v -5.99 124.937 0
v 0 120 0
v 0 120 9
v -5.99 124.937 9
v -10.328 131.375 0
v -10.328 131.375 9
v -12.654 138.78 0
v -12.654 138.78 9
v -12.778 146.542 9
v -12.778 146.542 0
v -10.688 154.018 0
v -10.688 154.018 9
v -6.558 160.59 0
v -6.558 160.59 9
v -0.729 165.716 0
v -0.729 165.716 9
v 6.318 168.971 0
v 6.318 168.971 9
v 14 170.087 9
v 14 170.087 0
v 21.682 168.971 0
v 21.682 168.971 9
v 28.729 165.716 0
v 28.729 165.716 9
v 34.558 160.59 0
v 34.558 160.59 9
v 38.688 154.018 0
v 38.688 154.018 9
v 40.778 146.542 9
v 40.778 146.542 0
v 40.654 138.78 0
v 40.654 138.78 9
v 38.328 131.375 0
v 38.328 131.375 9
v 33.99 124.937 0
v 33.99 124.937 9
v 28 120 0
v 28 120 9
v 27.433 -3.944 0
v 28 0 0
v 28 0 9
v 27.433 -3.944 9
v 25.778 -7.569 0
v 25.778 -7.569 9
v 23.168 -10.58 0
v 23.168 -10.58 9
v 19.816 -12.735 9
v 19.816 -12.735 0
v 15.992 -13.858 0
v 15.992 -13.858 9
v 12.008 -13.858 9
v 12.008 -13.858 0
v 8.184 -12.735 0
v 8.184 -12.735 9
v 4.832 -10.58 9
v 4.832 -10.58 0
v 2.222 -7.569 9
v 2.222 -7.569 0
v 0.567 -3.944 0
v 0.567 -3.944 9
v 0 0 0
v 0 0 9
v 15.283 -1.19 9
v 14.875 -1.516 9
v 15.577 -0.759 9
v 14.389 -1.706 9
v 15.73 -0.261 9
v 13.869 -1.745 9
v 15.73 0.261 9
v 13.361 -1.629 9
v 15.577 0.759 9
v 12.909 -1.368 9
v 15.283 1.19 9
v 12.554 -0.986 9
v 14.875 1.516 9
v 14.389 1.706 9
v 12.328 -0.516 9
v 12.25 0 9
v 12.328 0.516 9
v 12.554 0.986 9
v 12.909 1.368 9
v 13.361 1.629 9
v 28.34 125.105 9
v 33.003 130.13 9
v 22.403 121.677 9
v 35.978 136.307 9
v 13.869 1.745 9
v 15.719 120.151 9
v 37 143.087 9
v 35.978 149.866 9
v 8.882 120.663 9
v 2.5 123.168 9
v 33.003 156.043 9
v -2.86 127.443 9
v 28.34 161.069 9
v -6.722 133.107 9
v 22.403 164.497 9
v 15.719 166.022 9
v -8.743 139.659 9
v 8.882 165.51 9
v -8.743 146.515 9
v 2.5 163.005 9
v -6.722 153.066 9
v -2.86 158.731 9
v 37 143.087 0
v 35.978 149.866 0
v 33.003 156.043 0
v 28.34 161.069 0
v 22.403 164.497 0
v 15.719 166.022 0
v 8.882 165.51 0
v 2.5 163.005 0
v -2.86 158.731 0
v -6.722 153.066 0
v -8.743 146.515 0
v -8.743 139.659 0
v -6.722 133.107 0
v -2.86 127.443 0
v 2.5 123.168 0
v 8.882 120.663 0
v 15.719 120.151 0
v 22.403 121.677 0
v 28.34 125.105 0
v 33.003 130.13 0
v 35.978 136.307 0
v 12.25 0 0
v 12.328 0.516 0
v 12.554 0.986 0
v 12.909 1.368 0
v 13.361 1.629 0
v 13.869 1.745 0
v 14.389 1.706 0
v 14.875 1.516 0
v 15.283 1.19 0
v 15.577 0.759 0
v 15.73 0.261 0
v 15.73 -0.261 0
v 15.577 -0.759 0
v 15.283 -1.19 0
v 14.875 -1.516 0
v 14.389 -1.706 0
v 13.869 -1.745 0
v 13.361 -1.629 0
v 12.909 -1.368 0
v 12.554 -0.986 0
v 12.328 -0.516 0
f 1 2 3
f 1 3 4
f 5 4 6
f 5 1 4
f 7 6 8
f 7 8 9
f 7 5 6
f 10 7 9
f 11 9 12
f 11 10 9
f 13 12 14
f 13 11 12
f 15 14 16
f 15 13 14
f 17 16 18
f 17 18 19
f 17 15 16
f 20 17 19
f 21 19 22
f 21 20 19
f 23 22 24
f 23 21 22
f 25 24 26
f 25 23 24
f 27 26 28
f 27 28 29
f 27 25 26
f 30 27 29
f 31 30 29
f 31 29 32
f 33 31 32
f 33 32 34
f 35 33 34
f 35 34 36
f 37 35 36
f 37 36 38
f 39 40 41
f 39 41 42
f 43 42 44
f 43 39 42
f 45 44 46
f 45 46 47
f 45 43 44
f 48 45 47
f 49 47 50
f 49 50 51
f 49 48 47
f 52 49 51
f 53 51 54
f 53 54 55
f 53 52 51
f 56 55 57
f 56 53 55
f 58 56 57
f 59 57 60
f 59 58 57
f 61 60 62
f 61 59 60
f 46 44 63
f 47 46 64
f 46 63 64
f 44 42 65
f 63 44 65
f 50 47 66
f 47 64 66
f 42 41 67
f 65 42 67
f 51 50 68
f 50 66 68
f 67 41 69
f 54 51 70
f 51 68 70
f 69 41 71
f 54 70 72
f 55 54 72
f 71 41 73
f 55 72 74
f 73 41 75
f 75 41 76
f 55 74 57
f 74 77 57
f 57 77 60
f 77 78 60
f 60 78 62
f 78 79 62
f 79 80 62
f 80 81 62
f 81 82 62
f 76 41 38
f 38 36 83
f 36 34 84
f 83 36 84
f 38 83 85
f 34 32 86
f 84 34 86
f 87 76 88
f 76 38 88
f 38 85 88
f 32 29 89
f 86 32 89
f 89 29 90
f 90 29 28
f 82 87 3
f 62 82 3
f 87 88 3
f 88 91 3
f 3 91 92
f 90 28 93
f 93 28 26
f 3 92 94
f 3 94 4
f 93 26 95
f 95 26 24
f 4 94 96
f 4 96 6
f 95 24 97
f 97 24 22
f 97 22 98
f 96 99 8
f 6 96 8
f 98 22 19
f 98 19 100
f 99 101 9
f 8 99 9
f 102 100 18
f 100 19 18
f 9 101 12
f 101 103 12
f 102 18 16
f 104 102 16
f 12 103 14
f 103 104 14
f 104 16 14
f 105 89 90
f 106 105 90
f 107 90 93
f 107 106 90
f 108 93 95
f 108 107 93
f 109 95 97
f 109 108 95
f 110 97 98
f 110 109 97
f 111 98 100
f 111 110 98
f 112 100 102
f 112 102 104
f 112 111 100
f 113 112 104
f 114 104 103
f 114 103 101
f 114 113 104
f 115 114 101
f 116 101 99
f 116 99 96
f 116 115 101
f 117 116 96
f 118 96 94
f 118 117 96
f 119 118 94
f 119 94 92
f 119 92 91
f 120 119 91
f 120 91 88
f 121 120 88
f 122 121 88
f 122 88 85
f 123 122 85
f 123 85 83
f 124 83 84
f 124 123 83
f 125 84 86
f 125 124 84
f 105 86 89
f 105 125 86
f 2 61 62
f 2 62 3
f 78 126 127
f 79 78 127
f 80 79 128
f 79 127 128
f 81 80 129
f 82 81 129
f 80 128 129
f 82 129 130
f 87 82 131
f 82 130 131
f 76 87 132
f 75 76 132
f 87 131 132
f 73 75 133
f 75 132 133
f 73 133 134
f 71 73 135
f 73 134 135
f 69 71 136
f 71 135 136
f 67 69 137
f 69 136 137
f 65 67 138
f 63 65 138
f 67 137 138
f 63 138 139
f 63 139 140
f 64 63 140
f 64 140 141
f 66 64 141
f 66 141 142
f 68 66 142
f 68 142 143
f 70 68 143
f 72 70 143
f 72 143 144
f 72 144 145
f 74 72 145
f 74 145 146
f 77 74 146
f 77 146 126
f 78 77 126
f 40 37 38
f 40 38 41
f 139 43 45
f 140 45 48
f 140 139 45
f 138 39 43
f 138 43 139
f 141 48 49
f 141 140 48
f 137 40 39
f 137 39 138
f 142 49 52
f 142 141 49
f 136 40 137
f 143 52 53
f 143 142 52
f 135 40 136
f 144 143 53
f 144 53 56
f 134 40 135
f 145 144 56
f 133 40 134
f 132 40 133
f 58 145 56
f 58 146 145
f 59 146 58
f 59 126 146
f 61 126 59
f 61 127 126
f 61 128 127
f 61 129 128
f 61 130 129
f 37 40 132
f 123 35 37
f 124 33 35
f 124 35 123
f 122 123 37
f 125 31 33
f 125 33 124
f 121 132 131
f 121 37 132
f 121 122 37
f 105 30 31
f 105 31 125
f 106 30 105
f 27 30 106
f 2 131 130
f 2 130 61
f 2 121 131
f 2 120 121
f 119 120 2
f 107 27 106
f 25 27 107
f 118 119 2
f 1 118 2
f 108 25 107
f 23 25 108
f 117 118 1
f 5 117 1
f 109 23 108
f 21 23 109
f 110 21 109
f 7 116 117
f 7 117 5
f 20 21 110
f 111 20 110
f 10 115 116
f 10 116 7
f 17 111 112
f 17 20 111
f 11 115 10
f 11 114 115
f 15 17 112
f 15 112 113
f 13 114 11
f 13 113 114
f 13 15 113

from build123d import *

# Parameters (mm, degrees)
SKETCH_4_R          = 23
EXTRUDE_2_DEPTH     = 9
SKETCH_5_R          = 1.75
CUT_EXTRUDE_1_DEPTH = 10


with BuildPart() as part:
    # 草图4 → 凸台-拉伸2 (new body)
    with BuildSketch(Plane.XY):
        with BuildLine():
            Line((0, 0), (0, 120))
            ThreePointArc((0, 120), (14, 170.086792761), (28, 120))
            Line((28, 120), (28, 0))
            ThreePointArc((28, 0), (14, -14), (0, 0))
        make_face()
        with Locations((14, 143.086792761)):
            Circle(SKETCH_4_R, mode=Mode.SUBTRACT)
    extrude(amount=EXTRUDE_2_DEPTH)

    # 草图5 → 切除-拉伸1 (cut)
    with BuildSketch(Plane(origin=(0, 0, 0), x_dir=(-1, 0, 0), z_dir=(0, 0, -1))):
        with Locations((-14, 0)):
            Circle(SKETCH_5_R)
    extrude(amount=-CUT_EXTRUDE_1_DEPTH, mode=Mode.SUBTRACT)


solid = part.part
